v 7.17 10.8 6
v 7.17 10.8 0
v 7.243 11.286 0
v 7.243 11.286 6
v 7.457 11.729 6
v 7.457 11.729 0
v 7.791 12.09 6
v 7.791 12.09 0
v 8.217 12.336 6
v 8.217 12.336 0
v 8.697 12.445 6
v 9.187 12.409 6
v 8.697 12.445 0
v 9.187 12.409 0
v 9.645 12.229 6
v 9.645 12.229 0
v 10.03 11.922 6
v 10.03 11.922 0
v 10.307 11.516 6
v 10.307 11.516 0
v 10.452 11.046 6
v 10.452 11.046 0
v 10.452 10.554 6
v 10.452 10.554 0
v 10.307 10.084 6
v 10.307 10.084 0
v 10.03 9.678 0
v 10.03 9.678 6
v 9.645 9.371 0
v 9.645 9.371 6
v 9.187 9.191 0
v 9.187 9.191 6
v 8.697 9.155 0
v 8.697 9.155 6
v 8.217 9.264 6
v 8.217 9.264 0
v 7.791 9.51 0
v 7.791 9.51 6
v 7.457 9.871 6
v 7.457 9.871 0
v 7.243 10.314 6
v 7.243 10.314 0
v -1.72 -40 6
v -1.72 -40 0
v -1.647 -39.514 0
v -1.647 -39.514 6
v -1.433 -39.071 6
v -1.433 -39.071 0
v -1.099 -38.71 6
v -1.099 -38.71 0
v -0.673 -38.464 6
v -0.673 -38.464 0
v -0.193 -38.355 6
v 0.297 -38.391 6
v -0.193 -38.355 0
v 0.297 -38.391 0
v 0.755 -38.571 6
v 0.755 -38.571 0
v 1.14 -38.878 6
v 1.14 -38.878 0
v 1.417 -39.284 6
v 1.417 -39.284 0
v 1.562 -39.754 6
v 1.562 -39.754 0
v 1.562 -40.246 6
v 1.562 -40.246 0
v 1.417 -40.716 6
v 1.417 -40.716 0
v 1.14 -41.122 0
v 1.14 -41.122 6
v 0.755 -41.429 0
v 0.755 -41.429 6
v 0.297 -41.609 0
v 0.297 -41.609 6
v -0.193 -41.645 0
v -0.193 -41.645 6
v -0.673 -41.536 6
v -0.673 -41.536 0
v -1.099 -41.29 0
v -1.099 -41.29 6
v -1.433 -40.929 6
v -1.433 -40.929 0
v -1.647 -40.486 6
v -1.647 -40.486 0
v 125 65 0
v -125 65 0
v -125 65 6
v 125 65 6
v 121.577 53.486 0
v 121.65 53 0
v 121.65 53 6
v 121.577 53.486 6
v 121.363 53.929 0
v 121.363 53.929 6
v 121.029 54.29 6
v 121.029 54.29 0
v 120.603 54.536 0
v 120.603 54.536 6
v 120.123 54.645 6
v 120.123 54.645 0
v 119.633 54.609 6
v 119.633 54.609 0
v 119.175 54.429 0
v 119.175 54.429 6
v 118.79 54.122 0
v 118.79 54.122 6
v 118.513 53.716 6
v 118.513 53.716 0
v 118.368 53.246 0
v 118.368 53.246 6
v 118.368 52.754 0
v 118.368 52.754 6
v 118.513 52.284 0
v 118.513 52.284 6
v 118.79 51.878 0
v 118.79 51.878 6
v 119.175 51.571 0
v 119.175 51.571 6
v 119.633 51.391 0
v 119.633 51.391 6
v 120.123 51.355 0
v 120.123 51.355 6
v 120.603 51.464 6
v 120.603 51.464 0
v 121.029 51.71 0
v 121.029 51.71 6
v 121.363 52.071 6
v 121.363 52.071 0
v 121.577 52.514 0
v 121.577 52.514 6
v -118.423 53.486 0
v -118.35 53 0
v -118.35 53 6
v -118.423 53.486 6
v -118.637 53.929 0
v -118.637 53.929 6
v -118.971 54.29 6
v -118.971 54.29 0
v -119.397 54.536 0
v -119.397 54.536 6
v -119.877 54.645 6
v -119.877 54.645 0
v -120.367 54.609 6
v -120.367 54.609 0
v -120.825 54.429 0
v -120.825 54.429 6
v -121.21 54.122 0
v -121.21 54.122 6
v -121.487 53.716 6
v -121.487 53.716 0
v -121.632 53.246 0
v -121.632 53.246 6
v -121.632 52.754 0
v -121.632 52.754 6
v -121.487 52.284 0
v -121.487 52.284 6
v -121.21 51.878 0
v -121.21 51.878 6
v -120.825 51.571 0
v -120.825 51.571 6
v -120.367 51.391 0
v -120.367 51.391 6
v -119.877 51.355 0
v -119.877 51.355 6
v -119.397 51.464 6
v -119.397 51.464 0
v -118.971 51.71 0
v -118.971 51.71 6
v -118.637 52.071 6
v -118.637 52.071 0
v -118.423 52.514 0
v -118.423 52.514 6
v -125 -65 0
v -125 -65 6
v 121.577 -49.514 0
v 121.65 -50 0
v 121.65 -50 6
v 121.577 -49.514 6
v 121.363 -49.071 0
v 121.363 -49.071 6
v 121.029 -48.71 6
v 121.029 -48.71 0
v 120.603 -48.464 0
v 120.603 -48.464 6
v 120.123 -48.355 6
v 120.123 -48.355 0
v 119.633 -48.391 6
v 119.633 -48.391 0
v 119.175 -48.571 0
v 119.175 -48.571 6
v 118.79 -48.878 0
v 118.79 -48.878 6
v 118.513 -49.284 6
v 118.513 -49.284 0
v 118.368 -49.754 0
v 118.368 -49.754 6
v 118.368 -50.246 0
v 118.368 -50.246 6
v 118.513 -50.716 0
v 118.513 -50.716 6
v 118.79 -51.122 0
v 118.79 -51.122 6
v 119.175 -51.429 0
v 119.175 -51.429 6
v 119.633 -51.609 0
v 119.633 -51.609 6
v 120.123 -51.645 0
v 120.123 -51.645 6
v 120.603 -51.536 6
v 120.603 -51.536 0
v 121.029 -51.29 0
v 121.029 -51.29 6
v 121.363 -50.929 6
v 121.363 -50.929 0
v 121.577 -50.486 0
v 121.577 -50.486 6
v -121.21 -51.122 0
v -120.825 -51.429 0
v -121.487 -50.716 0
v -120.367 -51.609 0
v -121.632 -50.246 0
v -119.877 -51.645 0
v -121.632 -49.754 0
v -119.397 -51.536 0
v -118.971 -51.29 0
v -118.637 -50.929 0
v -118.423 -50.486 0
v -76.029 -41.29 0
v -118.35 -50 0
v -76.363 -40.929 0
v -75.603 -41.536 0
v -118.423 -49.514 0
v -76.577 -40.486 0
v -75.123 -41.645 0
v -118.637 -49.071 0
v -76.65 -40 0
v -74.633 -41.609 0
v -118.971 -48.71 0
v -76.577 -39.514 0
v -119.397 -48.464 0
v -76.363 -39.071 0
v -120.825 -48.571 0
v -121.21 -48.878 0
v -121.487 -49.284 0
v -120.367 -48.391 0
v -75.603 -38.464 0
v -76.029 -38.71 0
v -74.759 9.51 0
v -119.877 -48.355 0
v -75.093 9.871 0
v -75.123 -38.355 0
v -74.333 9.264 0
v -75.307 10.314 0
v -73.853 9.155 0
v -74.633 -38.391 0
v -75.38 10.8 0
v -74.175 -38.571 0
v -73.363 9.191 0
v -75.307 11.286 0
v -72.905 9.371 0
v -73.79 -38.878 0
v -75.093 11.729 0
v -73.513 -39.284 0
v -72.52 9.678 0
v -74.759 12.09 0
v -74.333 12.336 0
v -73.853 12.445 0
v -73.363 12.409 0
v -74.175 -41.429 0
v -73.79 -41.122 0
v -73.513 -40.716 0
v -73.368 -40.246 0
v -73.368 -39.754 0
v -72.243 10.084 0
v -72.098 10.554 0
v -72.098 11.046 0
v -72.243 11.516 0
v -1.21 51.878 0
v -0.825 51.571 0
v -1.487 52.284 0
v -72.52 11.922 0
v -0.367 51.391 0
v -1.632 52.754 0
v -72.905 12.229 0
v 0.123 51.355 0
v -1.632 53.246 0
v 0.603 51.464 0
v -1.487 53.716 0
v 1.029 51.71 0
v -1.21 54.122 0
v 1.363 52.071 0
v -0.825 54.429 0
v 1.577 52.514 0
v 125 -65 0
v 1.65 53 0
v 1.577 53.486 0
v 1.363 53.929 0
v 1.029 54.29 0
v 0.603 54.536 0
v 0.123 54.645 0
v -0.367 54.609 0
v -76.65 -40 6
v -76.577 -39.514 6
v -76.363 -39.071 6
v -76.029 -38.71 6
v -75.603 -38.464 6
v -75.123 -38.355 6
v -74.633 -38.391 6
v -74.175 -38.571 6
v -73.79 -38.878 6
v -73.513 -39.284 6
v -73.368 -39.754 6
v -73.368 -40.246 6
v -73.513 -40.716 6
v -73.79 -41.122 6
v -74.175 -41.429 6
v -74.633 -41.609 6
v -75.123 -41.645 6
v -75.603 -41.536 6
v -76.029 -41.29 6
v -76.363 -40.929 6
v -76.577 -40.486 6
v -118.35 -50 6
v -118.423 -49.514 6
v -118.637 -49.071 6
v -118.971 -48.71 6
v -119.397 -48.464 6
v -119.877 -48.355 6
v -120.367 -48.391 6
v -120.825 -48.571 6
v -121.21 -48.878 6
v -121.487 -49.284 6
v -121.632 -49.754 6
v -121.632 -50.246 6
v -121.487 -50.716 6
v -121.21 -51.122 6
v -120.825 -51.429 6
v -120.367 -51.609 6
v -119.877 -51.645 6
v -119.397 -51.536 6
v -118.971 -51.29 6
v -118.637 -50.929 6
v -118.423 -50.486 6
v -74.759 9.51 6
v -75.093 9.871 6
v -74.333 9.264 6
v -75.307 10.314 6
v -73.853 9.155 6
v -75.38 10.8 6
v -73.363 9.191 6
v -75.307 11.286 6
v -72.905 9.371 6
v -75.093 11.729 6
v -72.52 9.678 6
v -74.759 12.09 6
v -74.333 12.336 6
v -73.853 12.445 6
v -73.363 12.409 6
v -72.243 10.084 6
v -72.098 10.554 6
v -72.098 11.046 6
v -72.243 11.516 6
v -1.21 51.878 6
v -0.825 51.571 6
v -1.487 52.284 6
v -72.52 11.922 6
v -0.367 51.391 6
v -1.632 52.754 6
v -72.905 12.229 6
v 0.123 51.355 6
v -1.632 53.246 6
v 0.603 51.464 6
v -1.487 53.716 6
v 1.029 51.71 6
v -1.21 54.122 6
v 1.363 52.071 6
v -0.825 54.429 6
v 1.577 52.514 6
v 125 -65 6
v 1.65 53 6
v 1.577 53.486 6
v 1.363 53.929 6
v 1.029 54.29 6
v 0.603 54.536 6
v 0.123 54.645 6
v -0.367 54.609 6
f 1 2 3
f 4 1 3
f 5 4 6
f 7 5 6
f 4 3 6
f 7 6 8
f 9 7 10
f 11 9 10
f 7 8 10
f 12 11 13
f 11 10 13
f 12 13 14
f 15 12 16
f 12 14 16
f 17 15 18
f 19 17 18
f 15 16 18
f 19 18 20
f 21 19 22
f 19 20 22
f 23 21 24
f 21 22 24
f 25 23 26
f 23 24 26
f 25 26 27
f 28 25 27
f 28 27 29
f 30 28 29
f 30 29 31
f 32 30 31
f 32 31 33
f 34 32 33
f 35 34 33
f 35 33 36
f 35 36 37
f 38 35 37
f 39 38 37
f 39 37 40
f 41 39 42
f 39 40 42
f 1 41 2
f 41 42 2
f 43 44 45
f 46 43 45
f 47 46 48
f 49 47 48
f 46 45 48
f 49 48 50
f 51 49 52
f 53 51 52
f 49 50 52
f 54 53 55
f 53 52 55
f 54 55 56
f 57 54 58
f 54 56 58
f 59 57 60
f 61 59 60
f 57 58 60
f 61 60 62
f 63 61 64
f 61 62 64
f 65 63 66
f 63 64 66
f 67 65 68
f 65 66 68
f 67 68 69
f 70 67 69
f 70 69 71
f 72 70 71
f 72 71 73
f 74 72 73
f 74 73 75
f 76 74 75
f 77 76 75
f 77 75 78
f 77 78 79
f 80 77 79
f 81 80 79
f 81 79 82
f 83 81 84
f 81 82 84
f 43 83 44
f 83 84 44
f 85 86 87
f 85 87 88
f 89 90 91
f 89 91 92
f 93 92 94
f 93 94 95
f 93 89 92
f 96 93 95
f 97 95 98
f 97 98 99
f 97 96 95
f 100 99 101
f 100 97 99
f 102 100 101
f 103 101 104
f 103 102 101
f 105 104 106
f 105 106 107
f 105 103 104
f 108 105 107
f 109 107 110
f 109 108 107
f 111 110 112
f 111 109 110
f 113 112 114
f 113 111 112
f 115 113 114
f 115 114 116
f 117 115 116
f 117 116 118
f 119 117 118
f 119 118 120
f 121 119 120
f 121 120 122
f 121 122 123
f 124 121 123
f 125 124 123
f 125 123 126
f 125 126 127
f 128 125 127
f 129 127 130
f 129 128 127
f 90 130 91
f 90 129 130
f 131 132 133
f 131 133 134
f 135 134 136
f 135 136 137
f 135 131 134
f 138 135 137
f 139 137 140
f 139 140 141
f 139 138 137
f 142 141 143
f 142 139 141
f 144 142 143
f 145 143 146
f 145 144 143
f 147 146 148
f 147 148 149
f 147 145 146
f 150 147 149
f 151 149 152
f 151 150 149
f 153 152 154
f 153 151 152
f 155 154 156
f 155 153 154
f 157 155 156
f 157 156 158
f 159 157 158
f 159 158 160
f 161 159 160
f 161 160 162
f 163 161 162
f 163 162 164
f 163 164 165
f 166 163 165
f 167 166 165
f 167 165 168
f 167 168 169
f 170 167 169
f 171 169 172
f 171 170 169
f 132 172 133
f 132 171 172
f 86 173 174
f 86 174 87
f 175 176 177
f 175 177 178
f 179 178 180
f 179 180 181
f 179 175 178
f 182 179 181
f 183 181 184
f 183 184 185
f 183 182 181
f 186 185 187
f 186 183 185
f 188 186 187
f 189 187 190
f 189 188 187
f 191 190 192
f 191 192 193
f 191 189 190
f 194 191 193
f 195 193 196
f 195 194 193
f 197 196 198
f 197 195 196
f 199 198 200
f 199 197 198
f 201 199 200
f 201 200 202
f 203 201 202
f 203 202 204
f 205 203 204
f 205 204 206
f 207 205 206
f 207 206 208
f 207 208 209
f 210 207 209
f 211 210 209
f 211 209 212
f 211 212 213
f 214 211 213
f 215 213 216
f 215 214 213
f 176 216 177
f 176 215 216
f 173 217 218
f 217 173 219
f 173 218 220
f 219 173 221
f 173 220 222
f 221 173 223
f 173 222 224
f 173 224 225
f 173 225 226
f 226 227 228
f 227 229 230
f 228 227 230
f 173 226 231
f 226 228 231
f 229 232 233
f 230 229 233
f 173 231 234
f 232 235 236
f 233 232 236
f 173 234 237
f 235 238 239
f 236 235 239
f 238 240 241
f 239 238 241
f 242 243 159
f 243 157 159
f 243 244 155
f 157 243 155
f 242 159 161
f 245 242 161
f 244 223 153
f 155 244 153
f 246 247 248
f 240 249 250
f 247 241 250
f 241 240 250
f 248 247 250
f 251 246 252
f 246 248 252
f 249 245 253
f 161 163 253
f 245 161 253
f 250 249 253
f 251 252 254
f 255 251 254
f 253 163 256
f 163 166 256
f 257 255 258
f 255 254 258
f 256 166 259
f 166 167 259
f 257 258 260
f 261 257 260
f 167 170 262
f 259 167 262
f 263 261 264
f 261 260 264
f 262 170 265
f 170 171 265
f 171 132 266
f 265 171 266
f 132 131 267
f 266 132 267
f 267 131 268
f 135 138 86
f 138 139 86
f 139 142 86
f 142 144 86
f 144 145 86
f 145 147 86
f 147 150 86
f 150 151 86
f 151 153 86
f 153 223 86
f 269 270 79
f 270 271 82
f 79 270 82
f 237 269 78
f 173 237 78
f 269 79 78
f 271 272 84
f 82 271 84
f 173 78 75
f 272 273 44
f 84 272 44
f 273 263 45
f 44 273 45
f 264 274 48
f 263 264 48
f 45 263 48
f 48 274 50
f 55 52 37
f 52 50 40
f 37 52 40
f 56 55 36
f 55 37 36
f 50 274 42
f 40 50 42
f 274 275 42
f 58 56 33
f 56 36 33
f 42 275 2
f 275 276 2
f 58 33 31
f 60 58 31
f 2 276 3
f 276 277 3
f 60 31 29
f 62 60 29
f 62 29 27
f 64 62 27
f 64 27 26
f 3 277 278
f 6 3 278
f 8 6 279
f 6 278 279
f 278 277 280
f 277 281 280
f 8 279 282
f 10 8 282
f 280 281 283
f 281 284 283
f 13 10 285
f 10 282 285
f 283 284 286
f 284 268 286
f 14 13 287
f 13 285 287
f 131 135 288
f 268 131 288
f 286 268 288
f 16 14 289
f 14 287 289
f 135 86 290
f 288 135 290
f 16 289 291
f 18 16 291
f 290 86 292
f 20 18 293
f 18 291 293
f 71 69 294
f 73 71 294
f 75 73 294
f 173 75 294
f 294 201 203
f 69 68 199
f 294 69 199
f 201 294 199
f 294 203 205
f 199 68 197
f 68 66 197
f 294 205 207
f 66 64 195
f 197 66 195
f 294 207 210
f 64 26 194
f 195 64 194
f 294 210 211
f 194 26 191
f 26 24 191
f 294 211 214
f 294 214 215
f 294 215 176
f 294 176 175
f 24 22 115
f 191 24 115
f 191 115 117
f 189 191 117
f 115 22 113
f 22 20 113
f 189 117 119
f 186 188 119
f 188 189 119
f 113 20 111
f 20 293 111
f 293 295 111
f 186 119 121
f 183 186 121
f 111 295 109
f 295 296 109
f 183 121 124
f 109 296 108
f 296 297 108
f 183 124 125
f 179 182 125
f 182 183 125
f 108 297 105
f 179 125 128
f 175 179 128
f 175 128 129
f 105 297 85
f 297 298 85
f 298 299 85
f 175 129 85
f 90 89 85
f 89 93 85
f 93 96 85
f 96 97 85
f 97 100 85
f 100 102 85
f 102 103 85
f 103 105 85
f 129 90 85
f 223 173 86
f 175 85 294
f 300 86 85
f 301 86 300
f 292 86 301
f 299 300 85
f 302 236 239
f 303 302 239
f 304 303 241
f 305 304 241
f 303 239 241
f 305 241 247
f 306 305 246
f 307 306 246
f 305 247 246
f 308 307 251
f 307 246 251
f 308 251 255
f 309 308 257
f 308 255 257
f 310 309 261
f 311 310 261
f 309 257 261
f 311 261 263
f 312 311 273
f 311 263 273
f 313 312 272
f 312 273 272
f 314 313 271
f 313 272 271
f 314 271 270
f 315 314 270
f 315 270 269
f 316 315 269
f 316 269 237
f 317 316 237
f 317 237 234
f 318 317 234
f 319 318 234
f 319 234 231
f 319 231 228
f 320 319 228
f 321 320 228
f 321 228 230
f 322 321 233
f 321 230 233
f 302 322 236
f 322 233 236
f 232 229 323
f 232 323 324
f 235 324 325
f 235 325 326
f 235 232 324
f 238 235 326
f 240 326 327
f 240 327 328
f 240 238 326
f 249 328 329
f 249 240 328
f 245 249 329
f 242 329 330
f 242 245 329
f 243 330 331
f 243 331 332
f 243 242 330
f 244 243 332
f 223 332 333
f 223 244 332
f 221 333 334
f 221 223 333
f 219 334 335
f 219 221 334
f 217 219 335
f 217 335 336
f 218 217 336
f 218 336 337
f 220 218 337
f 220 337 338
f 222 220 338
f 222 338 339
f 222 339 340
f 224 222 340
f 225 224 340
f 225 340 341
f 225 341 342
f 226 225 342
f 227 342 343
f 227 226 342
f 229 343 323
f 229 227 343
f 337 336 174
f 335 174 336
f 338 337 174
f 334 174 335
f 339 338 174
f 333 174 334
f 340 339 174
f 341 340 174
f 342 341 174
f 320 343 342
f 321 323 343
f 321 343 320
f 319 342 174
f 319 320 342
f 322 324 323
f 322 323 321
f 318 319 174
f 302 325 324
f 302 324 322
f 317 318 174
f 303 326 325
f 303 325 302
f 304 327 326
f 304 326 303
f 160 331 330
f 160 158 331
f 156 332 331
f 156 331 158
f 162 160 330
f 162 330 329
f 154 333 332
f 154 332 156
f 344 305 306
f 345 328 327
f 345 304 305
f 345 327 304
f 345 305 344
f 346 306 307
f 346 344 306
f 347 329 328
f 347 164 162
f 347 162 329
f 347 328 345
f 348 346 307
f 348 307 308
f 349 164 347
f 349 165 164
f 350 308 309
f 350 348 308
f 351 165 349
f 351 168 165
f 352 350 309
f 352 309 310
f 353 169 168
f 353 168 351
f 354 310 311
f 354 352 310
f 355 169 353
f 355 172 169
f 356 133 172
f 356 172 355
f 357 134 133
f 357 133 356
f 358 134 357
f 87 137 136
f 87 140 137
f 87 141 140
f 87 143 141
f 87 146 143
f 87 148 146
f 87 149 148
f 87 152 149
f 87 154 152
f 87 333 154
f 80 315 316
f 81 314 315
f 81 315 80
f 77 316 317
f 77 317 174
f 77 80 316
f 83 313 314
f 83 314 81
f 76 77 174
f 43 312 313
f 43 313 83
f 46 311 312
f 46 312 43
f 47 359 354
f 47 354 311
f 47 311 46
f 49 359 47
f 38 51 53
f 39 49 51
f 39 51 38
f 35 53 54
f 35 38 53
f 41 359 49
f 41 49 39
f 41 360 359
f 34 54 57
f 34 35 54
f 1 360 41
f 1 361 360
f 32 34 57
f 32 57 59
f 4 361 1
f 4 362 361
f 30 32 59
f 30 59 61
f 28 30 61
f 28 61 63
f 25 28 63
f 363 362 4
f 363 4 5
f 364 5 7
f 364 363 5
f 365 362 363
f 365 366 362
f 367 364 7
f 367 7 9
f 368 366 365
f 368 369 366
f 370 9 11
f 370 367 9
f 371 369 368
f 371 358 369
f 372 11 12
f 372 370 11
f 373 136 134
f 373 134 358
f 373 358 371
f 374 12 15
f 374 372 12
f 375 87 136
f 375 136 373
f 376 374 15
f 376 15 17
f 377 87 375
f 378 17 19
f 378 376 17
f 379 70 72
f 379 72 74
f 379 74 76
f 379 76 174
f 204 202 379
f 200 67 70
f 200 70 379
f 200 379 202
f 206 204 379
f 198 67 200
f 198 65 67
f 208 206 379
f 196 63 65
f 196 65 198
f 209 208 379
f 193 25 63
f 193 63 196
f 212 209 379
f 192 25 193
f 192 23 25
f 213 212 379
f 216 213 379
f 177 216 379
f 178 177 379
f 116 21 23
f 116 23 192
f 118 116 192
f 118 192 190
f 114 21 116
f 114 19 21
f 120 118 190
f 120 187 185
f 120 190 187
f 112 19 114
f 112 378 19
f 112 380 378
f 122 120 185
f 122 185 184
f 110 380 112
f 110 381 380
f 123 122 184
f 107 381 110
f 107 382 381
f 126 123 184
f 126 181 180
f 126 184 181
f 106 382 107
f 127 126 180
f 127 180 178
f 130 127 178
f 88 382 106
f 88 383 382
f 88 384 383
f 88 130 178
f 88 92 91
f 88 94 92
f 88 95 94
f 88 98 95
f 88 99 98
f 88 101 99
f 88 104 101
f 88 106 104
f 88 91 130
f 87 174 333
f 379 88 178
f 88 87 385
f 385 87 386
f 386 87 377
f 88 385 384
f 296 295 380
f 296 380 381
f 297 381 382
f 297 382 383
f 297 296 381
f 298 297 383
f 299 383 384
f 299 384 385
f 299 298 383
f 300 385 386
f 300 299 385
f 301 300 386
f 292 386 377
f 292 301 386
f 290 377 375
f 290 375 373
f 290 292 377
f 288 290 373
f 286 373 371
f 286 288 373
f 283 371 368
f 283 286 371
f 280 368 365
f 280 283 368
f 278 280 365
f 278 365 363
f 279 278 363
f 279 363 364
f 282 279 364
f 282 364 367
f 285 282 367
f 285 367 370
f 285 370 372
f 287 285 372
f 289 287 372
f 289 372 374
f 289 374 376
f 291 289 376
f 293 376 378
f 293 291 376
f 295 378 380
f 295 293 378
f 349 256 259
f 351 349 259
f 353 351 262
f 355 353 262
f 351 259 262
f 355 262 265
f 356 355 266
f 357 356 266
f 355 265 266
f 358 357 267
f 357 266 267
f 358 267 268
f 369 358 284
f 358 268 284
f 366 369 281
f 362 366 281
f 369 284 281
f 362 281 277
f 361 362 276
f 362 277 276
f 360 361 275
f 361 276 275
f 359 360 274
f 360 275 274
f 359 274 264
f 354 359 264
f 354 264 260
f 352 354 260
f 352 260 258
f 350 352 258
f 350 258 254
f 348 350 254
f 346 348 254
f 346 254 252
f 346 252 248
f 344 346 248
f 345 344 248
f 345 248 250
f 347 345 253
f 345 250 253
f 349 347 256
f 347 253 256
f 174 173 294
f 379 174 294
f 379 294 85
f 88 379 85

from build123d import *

# Parameters (mm, degrees)
ESBO_O1_W                = 250
ESBO_O1_H                = 130
ESBO_O1_R                = 1.65
RESSALTO_EXTRUS_O1_DEPTH = 6
ESBO_O2_R                = 1.65
CORTE_EXTRUS_O1_DEPTH    = 6


with BuildPart() as part:
    # Esboço1 → Ressalto-extrusão1 (new body)
    with BuildSketch(Plane.XY):
        Rectangle(ESBO_O1_W, ESBO_O1_H)
        with Locations((-120, 53)):
            Circle(ESBO_O1_R, mode=Mode.SUBTRACT)
        with Locations((-120, -50)):
            Circle(ESBO_O1_R, mode=Mode.SUBTRACT)
        with Locations((0, 53)):
            Circle(ESBO_O1_R, mode=Mode.SUBTRACT)
        with Locations((120, -50)):
            Circle(ESBO_O1_R, mode=Mode.SUBTRACT)
        with Locations((120, 53)):
            Circle(ESBO_O1_R, mode=Mode.SUBTRACT)
    extrude(amount=RESSALTO_EXTRUS_O1_DEPTH)

    # Esboço2 → Corte-extrusão1 (cut)
    with BuildSketch(Plane(origin=(0, 0, 0), x_dir=(-1, 0, 0), z_dir=(0, 0, -1))):
        with Locations((73.73, 10.8)):
            Circle(ESBO_O2_R)
        with Locations((75, -40)):
            Circle(ESBO_O2_R)
        with Locations((0.07, -40)):
            Circle(ESBO_O2_R)
        with Locations((-8.82, 10.8)):
            Circle(ESBO_O2_R)
    extrude(amount=-CORTE_EXTRUS_O1_DEPTH, mode=Mode.SUBTRACT)


solid = part.part
